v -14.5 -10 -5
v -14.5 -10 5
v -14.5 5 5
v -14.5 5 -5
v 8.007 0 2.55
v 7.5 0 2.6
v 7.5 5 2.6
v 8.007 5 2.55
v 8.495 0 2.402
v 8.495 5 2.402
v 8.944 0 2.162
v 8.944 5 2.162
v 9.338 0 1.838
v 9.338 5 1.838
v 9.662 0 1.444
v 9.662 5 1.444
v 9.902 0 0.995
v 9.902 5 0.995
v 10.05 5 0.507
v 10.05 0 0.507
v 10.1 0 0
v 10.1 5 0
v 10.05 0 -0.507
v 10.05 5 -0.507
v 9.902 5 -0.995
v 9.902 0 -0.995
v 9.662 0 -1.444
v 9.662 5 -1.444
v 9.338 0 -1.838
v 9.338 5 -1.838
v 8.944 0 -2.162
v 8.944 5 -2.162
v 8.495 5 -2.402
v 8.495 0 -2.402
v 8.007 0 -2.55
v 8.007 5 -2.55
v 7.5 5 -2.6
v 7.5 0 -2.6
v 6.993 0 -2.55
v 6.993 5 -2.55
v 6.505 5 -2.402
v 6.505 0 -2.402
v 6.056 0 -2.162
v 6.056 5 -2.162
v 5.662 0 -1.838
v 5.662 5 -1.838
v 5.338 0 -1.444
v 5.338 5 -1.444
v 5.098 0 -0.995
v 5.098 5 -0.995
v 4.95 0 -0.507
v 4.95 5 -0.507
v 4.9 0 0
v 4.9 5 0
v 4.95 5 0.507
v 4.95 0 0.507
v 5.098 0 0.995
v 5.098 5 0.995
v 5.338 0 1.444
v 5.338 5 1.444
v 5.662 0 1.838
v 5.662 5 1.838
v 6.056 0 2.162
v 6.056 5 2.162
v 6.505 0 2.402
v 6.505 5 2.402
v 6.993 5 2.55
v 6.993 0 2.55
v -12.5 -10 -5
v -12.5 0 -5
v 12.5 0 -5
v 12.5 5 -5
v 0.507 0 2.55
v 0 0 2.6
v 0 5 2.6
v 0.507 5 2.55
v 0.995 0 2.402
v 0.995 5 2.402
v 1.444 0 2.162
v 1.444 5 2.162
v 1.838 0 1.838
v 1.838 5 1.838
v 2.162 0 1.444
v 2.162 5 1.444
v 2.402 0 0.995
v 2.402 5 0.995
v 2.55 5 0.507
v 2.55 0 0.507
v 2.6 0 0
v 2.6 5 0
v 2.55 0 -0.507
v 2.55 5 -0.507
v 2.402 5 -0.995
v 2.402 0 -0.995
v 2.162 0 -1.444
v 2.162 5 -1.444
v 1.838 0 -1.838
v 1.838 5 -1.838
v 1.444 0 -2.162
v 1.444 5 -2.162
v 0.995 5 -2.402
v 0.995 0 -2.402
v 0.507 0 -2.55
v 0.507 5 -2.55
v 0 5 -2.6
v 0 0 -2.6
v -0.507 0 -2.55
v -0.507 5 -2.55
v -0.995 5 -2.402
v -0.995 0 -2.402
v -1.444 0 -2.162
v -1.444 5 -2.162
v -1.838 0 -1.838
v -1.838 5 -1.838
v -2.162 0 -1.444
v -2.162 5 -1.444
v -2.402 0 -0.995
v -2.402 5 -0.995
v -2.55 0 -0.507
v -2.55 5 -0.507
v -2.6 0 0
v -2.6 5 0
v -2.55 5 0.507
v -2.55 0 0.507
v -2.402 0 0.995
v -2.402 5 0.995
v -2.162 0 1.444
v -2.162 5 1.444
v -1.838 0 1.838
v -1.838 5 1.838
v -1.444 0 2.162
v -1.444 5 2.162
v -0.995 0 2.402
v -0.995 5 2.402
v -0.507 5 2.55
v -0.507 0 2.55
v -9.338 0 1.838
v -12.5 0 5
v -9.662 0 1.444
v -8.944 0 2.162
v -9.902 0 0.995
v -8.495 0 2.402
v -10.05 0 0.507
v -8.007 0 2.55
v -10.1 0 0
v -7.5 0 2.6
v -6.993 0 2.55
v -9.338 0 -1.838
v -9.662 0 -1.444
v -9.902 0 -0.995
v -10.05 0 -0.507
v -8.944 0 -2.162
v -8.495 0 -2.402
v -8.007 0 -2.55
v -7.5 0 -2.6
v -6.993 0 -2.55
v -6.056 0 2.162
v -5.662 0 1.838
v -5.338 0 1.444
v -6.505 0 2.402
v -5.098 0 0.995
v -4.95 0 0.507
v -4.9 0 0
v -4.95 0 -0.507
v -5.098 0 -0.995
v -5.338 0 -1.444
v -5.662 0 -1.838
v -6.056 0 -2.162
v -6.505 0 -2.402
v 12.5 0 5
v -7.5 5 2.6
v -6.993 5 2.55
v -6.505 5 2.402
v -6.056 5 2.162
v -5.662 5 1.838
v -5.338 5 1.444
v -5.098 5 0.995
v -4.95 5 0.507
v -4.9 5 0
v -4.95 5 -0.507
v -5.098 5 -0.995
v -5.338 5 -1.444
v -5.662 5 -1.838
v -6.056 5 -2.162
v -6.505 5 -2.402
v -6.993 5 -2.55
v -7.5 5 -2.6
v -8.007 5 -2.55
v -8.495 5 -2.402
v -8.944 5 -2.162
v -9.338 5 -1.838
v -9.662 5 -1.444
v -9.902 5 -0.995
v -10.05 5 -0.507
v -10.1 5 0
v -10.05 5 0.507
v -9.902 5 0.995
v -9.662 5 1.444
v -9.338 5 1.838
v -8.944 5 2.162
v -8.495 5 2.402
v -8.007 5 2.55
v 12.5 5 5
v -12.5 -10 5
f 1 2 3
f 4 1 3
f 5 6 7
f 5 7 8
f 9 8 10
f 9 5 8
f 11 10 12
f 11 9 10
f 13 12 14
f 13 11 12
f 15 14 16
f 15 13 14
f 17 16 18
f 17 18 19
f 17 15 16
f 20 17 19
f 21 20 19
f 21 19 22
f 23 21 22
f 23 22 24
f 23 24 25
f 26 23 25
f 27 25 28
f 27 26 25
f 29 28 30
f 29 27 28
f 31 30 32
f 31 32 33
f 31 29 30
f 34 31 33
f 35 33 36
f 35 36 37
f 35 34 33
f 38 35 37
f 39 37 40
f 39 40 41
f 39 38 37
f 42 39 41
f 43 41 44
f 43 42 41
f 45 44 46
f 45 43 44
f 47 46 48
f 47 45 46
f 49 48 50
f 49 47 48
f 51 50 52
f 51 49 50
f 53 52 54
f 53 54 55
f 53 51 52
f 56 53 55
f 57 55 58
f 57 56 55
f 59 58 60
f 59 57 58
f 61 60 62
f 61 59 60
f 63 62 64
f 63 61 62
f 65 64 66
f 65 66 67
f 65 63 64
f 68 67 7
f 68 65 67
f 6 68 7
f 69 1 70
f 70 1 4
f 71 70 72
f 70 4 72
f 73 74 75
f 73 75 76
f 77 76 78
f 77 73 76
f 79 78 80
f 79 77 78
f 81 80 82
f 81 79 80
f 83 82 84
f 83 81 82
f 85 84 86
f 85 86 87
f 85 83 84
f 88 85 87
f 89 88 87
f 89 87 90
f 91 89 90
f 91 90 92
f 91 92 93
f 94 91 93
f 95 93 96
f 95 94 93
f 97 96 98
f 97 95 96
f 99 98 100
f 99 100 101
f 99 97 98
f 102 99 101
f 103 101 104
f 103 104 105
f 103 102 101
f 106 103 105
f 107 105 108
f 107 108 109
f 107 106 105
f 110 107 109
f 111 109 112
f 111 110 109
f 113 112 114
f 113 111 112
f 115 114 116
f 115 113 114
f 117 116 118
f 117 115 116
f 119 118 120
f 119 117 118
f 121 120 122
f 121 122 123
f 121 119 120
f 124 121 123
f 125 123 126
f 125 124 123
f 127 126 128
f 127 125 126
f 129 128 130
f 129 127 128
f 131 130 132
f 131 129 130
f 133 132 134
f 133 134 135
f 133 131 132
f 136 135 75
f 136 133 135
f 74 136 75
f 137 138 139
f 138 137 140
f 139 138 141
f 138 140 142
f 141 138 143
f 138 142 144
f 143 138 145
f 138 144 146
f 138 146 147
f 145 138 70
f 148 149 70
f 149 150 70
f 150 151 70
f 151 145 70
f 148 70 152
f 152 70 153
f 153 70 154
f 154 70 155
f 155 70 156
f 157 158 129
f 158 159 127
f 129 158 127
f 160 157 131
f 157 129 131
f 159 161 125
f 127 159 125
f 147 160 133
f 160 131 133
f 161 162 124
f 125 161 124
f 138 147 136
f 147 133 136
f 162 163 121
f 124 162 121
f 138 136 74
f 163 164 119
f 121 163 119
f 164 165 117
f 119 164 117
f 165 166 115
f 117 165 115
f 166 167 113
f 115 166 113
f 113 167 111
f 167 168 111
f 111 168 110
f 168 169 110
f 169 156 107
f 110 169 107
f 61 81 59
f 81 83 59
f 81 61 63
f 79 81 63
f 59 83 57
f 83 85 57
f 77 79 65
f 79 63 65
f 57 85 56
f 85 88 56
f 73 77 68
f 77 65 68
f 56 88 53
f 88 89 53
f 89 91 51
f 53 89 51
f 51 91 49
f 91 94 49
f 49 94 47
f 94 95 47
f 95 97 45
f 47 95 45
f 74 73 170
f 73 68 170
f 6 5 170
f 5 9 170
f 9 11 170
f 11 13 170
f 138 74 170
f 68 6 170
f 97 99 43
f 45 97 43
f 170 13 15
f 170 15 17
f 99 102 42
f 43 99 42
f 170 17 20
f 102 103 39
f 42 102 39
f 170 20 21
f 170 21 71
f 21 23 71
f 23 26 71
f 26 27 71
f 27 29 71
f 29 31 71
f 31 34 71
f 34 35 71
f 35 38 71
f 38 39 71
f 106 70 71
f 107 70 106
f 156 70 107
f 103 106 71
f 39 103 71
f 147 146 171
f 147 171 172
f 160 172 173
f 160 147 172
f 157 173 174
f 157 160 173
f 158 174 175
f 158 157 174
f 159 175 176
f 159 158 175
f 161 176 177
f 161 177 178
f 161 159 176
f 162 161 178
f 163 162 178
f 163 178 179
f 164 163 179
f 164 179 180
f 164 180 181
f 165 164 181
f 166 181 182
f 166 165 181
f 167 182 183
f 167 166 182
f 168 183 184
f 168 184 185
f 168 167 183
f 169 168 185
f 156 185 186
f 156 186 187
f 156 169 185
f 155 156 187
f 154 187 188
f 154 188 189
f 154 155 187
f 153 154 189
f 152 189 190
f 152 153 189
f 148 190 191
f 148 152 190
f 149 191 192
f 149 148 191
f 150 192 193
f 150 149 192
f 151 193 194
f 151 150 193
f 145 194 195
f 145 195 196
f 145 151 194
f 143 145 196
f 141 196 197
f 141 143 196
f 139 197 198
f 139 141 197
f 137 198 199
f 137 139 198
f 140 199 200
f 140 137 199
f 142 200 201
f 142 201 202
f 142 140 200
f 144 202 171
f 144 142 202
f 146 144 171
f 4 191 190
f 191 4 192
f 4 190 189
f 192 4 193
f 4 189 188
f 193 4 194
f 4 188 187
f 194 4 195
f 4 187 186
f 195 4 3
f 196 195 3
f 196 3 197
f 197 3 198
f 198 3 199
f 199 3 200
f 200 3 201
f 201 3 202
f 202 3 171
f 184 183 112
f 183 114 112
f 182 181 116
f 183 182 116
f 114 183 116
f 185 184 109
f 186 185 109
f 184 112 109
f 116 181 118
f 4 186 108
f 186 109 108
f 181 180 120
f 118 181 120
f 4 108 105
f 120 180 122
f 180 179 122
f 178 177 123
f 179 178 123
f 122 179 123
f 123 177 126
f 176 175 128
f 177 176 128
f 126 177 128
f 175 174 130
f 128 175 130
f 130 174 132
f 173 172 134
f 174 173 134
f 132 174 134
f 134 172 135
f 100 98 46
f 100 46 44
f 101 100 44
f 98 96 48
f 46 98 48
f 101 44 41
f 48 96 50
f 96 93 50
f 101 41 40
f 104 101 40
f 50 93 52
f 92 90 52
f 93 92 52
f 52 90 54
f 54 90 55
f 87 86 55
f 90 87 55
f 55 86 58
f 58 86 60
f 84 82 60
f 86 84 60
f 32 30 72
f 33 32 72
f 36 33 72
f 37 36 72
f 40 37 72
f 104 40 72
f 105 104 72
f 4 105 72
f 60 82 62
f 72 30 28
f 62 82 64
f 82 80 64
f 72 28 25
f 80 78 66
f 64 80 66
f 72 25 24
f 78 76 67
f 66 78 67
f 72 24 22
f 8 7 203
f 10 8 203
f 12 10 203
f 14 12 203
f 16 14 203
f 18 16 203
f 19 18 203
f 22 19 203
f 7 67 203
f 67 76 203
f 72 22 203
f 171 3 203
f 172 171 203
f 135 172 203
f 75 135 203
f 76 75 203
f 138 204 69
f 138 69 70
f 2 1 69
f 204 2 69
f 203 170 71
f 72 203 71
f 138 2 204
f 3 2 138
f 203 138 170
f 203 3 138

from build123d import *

# Parameters (mm, degrees)
SKETCH1_W           = 25
SKETCH1_H           = 10
SKETCH1_R           = 2.6
BOSS_EXTRUDE1_DEPTH = 5
SKETCH2_W           = 2
SKETCH2_H           = 15
BOSS_EXTRUDE2_DEPTH = 10


with BuildPart() as part:
    # Sketch1 → Boss-Extrude1 (new body)
    with BuildSketch(Plane(origin=(0, 0, 0), x_dir=(1, 0, 0), z_dir=(0, 1, 0))):
        Rectangle(SKETCH1_W, SKETCH1_H)
        with Locations(Location((-7.5, 0, 0), (0, 0, 270))):
            Circle(SKETCH1_R, mode=Mode.SUBTRACT)
        with Locations(Location((0, 0, 0), (0, 0, 270))):
            Circle(SKETCH1_R, mode=Mode.SUBTRACT)
        with Locations(Location((7.5, 0, 0), (0, 0, 270))):
            Circle(SKETCH1_R, mode=Mode.SUBTRACT)
    extrude(amount=BOSS_EXTRUDE1_DEPTH)

    # Sketch2 → Boss-Extrude2 (add)
    with BuildSketch(Plane.XY.offset(5)):
        with Locations((-13.5, -2.5)):
            Rectangle(SKETCH2_W, SKETCH2_H)
    extrude(amount=-BOSS_EXTRUDE2_DEPTH)


solid = part.part
